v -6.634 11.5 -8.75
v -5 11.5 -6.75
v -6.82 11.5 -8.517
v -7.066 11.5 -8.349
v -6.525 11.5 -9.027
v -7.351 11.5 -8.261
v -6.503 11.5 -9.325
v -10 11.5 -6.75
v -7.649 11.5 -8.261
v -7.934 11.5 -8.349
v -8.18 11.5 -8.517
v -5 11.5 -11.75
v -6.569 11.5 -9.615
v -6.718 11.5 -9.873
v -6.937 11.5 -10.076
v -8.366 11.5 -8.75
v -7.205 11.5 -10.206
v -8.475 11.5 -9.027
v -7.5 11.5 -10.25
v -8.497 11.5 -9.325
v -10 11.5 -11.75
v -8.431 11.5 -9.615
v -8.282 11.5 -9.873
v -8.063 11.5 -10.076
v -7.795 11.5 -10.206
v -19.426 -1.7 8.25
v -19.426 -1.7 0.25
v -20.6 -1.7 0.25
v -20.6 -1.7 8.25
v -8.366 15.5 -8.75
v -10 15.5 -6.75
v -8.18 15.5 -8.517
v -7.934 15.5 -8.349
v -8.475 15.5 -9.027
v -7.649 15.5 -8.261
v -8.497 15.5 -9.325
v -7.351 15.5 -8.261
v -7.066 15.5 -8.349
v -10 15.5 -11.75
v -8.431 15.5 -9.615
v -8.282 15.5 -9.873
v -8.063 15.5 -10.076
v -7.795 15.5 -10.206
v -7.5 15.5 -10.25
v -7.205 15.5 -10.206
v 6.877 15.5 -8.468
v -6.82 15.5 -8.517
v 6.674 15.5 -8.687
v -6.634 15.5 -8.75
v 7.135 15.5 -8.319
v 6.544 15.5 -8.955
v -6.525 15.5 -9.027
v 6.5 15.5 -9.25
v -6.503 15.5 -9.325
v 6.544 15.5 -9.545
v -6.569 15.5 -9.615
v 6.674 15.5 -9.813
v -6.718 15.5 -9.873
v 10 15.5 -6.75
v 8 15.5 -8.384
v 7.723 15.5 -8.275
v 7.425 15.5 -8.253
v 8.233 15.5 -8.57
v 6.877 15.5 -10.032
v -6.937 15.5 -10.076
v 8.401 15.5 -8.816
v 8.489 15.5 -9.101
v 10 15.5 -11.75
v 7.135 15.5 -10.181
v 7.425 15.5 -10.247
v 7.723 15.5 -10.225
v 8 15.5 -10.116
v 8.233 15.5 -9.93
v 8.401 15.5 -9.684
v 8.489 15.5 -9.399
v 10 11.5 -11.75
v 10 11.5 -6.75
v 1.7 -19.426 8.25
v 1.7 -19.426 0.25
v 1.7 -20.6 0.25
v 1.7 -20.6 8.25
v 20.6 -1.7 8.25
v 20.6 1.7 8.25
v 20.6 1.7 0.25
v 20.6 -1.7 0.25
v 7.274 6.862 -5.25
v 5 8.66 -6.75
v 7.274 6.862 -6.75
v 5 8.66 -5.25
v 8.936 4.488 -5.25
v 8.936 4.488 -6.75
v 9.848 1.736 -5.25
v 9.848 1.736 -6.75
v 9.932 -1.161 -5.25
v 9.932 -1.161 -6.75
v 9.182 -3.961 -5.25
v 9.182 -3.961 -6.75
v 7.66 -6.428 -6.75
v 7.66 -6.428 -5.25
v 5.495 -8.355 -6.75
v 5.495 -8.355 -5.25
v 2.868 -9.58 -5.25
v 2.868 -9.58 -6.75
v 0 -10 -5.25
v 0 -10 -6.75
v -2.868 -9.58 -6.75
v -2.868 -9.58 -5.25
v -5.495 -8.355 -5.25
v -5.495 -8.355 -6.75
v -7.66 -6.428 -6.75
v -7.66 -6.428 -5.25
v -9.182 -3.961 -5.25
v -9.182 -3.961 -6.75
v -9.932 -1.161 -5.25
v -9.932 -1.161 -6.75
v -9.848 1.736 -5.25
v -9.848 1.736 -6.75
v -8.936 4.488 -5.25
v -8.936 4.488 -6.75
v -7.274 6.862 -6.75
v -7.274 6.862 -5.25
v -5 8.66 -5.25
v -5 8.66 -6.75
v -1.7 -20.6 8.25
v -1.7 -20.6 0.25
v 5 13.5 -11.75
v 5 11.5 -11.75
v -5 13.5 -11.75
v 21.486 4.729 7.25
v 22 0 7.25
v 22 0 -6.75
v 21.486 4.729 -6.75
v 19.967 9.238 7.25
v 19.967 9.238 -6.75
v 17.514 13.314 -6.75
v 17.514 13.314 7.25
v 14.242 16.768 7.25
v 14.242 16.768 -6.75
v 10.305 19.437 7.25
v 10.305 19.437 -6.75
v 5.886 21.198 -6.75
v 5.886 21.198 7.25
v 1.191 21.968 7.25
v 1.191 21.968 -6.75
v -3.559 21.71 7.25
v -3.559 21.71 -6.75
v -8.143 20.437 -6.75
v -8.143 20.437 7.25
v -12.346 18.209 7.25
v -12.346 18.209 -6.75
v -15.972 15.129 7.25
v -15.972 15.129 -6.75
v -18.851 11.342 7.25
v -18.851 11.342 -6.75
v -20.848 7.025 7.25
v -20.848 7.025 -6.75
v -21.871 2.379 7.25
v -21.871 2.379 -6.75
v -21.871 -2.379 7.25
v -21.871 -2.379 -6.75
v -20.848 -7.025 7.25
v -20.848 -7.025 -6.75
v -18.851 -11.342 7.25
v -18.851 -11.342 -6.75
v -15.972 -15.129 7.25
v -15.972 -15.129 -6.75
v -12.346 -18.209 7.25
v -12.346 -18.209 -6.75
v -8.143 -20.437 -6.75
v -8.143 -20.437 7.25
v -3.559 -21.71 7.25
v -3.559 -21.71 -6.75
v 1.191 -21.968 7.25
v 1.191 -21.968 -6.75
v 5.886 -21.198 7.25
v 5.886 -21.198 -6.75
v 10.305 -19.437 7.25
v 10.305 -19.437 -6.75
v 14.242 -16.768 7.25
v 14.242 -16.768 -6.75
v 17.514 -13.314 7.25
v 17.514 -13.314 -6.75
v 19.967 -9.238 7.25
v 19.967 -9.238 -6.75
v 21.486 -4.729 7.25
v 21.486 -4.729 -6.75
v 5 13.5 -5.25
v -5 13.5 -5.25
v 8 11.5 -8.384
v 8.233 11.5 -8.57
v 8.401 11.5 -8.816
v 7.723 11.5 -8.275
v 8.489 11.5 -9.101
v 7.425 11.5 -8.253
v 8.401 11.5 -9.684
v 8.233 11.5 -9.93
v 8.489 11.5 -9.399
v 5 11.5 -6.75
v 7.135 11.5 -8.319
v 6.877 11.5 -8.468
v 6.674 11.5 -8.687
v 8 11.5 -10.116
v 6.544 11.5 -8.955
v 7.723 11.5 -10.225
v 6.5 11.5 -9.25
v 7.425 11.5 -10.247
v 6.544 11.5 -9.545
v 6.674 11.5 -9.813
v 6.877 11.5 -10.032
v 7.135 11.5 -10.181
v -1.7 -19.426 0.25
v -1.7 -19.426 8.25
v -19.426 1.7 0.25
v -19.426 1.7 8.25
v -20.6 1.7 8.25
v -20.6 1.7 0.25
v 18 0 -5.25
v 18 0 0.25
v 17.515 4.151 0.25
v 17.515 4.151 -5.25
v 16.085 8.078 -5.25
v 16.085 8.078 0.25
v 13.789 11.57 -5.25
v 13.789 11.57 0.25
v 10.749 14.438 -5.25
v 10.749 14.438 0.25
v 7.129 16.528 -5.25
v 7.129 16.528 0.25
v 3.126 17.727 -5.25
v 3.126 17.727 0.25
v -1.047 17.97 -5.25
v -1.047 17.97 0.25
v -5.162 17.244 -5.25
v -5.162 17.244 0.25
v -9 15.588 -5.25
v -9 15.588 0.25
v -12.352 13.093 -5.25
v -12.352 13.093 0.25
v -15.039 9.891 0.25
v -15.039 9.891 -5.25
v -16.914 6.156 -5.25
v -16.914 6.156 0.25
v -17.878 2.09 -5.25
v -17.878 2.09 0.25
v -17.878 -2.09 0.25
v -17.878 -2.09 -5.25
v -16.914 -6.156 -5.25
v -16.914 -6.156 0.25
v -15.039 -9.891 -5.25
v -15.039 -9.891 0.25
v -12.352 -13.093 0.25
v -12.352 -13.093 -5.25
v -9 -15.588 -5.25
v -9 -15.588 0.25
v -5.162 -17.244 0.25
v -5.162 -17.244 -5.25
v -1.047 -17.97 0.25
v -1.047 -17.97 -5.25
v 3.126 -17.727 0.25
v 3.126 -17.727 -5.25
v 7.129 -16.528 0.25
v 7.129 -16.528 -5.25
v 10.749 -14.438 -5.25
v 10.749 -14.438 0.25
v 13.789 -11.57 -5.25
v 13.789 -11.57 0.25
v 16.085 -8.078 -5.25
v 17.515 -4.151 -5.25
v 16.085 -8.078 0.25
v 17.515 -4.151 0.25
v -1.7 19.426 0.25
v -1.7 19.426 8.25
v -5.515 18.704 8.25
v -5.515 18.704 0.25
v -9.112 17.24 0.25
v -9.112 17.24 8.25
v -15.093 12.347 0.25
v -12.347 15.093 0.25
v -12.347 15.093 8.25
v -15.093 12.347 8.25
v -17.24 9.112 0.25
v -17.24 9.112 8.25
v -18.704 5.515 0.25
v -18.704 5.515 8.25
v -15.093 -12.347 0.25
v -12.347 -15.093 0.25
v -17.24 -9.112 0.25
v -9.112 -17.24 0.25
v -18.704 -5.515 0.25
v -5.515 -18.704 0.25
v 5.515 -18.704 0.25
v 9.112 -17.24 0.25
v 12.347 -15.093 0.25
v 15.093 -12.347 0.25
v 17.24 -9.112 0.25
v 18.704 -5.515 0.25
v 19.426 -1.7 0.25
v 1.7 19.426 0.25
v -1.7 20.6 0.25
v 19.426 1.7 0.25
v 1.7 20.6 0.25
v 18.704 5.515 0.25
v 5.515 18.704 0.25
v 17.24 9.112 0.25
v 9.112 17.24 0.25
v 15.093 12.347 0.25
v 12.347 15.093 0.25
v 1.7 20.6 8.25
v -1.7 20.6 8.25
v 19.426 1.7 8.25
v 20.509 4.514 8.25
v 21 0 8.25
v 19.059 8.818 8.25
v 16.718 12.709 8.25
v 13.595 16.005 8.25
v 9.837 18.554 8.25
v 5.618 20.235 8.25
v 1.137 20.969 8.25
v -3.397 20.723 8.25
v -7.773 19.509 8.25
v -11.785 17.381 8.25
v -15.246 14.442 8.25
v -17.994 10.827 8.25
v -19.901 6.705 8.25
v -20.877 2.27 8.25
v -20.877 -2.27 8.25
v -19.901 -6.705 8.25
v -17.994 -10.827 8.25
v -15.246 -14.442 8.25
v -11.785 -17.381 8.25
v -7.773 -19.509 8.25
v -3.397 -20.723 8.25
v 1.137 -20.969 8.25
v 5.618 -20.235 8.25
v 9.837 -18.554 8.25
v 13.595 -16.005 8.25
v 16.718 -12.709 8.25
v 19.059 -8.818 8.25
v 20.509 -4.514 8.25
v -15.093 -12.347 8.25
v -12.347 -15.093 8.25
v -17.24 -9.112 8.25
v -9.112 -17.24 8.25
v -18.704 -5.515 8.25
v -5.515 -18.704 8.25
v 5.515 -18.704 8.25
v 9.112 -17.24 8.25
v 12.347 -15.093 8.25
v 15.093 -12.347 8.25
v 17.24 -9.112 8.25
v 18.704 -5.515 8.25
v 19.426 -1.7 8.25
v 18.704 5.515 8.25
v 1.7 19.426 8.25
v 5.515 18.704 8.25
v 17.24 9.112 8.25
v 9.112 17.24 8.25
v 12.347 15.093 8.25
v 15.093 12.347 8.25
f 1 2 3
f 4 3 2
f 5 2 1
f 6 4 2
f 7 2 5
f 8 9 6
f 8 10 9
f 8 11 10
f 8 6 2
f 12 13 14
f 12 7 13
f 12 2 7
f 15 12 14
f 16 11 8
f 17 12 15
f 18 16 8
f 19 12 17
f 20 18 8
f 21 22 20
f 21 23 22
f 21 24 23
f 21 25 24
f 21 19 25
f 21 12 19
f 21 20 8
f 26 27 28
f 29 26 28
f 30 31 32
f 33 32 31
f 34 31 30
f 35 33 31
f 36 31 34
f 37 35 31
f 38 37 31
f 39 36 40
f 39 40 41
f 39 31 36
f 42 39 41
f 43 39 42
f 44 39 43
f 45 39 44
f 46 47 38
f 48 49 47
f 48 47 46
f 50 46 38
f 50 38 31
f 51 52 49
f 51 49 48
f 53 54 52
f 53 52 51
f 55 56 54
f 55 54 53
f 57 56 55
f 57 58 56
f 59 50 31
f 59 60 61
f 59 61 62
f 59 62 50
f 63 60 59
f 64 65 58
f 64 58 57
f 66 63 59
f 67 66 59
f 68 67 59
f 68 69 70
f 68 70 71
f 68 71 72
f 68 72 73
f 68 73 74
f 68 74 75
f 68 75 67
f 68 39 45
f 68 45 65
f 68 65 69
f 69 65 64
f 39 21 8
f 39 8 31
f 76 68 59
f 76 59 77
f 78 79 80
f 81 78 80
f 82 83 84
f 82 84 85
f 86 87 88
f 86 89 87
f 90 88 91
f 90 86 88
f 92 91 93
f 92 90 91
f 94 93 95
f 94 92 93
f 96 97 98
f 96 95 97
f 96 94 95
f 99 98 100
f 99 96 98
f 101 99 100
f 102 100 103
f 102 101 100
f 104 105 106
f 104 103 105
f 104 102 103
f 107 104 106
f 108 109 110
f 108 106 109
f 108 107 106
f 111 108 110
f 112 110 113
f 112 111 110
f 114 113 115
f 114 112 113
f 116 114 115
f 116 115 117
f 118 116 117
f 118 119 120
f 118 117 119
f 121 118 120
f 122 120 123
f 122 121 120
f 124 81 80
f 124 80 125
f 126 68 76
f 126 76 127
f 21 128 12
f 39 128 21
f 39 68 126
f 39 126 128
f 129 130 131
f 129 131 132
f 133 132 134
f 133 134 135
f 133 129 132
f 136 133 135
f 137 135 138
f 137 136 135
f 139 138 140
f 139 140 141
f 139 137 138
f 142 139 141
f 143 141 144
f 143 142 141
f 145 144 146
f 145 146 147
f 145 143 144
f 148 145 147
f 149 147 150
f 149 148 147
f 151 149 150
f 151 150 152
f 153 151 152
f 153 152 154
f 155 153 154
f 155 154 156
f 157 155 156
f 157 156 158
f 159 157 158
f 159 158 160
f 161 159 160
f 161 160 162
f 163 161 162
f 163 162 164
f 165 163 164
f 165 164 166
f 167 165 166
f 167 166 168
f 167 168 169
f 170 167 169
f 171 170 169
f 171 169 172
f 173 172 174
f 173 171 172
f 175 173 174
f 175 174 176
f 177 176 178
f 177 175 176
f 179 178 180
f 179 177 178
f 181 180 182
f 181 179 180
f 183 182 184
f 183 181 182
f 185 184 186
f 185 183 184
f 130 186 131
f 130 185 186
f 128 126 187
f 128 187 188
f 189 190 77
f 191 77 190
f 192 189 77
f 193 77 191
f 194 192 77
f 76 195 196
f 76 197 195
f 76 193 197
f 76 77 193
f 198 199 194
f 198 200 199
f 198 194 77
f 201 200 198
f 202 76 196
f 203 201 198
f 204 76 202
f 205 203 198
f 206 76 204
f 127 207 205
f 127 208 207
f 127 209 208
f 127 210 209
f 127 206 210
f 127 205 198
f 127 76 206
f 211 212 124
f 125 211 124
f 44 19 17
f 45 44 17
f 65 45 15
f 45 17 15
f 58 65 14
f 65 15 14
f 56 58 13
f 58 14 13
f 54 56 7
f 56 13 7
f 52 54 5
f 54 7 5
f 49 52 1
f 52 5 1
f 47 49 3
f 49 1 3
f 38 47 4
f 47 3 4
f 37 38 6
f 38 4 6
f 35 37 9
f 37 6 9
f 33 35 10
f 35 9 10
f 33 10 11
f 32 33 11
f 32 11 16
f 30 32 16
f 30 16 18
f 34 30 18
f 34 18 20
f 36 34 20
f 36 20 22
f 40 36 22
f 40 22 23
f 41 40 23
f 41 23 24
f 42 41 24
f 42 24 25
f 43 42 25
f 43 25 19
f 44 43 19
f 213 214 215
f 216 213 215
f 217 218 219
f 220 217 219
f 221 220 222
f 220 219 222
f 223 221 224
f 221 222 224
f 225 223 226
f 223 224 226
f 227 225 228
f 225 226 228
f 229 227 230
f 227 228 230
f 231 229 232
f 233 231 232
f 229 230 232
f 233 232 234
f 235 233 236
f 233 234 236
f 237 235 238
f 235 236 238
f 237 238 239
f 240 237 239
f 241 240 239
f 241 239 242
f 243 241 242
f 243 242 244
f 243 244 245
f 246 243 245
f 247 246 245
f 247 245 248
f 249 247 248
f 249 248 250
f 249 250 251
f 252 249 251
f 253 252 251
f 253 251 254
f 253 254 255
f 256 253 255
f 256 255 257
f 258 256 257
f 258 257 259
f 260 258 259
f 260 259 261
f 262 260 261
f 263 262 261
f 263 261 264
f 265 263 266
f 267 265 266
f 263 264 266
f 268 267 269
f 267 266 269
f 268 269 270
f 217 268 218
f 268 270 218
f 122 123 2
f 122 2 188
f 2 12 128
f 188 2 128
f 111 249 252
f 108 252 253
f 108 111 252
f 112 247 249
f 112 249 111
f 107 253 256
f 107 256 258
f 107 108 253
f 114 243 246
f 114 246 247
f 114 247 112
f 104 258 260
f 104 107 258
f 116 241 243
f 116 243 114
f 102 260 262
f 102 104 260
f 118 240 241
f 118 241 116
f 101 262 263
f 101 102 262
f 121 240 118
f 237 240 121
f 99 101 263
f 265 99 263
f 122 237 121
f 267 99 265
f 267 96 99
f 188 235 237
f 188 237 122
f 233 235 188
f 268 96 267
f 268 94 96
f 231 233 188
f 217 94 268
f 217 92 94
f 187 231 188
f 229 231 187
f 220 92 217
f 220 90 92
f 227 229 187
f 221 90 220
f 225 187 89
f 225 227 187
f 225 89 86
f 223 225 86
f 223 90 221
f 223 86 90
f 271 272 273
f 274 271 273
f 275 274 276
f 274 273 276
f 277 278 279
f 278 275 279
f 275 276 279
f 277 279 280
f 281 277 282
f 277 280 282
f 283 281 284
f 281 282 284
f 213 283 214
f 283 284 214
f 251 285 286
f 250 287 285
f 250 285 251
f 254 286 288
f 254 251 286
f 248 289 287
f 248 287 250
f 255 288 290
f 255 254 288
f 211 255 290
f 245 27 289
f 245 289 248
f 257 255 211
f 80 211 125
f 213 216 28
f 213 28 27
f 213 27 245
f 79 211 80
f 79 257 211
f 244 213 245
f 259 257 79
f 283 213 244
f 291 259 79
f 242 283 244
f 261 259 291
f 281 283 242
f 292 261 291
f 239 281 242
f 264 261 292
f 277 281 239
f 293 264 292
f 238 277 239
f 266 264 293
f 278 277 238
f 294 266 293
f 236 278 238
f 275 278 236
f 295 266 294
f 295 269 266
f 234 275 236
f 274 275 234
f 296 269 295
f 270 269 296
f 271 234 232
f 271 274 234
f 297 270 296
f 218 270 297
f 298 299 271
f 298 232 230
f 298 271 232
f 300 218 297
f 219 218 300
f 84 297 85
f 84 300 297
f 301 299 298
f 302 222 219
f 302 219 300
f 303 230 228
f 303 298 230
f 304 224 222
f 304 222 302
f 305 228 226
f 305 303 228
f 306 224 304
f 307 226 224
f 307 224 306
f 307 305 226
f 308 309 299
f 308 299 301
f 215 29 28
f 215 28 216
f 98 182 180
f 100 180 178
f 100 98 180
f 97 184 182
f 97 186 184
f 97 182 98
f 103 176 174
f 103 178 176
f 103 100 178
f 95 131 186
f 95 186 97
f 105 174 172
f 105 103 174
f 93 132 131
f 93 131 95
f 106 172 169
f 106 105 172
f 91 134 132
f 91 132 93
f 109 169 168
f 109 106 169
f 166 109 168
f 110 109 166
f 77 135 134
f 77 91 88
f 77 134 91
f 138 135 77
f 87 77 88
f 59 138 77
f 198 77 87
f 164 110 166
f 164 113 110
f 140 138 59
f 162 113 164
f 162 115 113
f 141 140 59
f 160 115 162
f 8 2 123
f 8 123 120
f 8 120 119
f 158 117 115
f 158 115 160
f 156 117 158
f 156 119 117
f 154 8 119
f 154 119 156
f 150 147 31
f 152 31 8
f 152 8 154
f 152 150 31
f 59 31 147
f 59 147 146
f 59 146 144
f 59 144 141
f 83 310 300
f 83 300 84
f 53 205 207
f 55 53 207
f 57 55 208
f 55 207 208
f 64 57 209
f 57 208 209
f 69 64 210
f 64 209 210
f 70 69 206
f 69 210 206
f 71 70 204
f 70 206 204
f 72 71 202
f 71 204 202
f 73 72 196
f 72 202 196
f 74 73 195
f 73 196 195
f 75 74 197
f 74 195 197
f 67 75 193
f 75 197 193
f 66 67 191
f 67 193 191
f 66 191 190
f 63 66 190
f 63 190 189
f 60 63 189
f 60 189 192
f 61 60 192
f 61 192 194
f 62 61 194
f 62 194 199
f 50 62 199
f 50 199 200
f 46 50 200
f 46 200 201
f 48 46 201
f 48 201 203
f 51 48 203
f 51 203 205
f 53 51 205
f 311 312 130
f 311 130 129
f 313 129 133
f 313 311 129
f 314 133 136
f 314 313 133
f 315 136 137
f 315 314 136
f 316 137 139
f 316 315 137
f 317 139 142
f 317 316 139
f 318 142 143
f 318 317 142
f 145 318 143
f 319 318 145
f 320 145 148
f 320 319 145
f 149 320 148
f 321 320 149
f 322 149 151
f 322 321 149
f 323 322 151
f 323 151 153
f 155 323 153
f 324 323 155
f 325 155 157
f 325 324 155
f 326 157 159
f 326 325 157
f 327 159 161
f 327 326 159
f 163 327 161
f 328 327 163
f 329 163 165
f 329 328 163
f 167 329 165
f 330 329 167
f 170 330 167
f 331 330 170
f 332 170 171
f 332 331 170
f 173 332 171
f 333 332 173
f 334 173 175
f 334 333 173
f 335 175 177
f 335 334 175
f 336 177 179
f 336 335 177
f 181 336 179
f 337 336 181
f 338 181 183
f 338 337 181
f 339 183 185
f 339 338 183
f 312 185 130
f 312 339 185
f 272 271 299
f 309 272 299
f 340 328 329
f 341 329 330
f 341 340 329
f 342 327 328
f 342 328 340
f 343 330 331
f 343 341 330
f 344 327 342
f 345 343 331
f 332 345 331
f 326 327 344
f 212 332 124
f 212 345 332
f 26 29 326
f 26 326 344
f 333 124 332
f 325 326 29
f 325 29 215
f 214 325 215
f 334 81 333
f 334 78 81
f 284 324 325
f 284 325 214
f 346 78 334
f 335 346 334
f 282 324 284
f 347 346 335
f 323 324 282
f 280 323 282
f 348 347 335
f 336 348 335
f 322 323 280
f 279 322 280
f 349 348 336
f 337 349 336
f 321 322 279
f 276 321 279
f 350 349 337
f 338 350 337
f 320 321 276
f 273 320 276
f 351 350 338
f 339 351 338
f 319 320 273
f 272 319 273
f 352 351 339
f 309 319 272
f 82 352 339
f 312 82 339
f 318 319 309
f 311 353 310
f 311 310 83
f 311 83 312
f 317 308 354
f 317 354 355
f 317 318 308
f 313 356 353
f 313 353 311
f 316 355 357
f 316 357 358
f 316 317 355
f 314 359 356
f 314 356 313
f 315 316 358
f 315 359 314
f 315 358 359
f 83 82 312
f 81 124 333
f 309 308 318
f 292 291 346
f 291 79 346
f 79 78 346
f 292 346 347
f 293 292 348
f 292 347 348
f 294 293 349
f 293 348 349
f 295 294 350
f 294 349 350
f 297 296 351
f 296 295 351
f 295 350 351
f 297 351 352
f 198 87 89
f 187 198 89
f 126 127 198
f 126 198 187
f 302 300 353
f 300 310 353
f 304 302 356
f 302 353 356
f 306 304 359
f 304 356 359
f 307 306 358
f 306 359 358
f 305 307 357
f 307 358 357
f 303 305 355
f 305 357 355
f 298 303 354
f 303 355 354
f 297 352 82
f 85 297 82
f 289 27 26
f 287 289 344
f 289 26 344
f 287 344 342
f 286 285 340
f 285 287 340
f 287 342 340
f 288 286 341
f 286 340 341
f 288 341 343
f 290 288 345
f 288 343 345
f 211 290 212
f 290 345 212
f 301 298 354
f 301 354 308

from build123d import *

# Parameters (mm, degrees)
SKETCH1_R               = 22
BOSS_EXTRUDE1_DEPTH     = 8.25
SKETCH2_R               = 18
CUT_EXTRUDE1_DEPTH      = 13.5
SKETCH3_R               = 19.5
CUT_EXTRUDE2_DEPTH      = 8
CUT_EXTRUDE3_DEPTH      = 36.217183306
CUT_EXTRUDE3_DEPTH_BACK = 36.217183306
SKETCH4_R               = 10
SKETCH6_W               = 3.4
SKETCH6_H               = 2.2
CUT_EXTRUDE5_DEPTH      = 8
CIRPATTERN1_COUNT       = 4
CUT_EXTRUDE6_START      = -1.5
SKETCH7_R               = 22
CUT_EXTRUDE6_DEPTH      = 1.5
CHAMFER1_SIZE           = 1
BOSS_EXTRUDE2_START     = 5
BOSS_EXTRUDE2_DEPTH     = 5
SKETCH9_W               = 10
SKETCH9_H               = 5
CUT_EXTRUDE7_DEPTH      = 37.986484018
SKETCH10_R              = 1
CUT_EXTRUDE8_DEPTH      = 42.764967377


with BuildPart() as part:
    # Sketch1 → Boss-Extrude1 (new, symmetric)
    with BuildSketch(Plane.XY):
        Circle(SKETCH1_R)
    extrude(amount=BOSS_EXTRUDE1_DEPTH, both=True)

    # Sketch2 → Cut-Extrude1 (cut)
    with BuildSketch(Plane.XY.offset(8.25)):
        Circle(SKETCH2_R)
    extrude(amount=-CUT_EXTRUDE1_DEPTH, mode=Mode.SUBTRACT)

    # Sketch3 → Cut-Extrude2 (cut)
    with BuildSketch(Plane.XY.offset(8.25)):
        Circle(SKETCH3_R)
    extrude(amount=-CUT_EXTRUDE2_DEPTH, mode=Mode.SUBTRACT)

    # Sketch4 → Cut-Extrude3 (cut, two sides: drawn at the far end of the back side and taken through both)
    with BuildSketch(Plane(origin=(0, 0, -8.25), x_dir=(-1, 0, 0), z_dir=(0, 0, -1)).offset(-CUT_EXTRUDE3_DEPTH_BACK)):
        with Locations(Location((0, 0, 0), (0, 0, 180))):
            Circle(SKETCH4_R)
    extrude(amount=CUT_EXTRUDE3_DEPTH + CUT_EXTRUDE3_DEPTH_BACK, mode=Mode.SUBTRACT)

    # Sketch6 → Cut-Extrude5 (cut)
    with BuildSketch(Plane.XY.offset(8.25)):
        with Locations((0, 19.5)):
            Rectangle(SKETCH6_W, SKETCH6_H)
    cut_extrude5 = extrude(amount=-CUT_EXTRUDE5_DEPTH, mode=Mode.SUBTRACT)

    # CirPattern1: Cut-Extrude5 ×4 about axis
    cirpattern1_axis = Axis((0, 0, 0), (0, 0, 1))
    for i in range(1, CIRPATTERN1_COUNT):
        add(cut_extrude5.rotate(cirpattern1_axis, i * 360 / CIRPATTERN1_COUNT), mode=Mode.SUBTRACT)

    # Sketch7 → Cut-Extrude6 (cut)
    with BuildSketch(Plane(origin=(0, 0, -8.25), x_dir=(-1, 0, 0), z_dir=(0, 0, -1)).offset(CUT_EXTRUDE6_START)):
        Circle(SKETCH7_R)
    extrude(amount=CUT_EXTRUDE6_DEPTH, mode=Mode.SUBTRACT)

    # Chamfer1
    chamfer1_edges = [part.edges().sort_by_distance(p)[0] for p in [
        (-22, 0, 8.25),
    ]]
    chamfer(chamfer1_edges, length=CHAMFER1_SIZE)

    # Sketch8 → Boss-Extrude2 (add)
    with BuildSketch(Plane(origin=(0, 0, -6.75), x_dir=(-1, 0, 0), z_dir=(0, 0, -1)).offset(BOSS_EXTRUDE2_START)):
        with BuildLine():
            Line((5, 9), (5, 11.5))
            Line((5, 11.5), (10, 11.5))
            Line((10, 11.5), (10, 15.5))
            Line((10, 15.5), (-10, 15.5))
            Line((-10, 15.5), (-10, 11.5))
            Line((-10, 11.5), (-5, 11.5))
            Line((-5, 11.5), (-5, 9))
            Line((-5, 9), (-4.358898944, 9))
            ThreePointArc((-4.358898944, 9), (0, 10), (4.358898944, 9))
            Line((4.358898944, 9), (5, 9))
        make_face()
    extrude(amount=-BOSS_EXTRUDE2_DEPTH)

    # Sketch9 → Cut-Extrude7 (cut, through all)
    with BuildSketch(Plane(origin=(0, 0, -11.75), x_dir=(-1, 0, 0), z_dir=(0, 0, -1))):
        with Locations((0, 11)):
            Rectangle(SKETCH9_W, SKETCH9_H)
    extrude(amount=-CUT_EXTRUDE7_DEPTH, mode=Mode.SUBTRACT)

    # Sketch10 → Cut-Extrude8 (cut, through all)
    with BuildSketch(Plane.XZ.offset(-11.5)):
        with Locations(Location((-7.5, -9.25, 0), (0, 0, 270))):
            Circle(SKETCH10_R)
        with Locations(Location((7.5, -9.25, 0), (0, 0, 180))):
            Circle(SKETCH10_R)
    extrude(amount=-CUT_EXTRUDE8_DEPTH, mode=Mode.SUBTRACT)


solid = part.part
